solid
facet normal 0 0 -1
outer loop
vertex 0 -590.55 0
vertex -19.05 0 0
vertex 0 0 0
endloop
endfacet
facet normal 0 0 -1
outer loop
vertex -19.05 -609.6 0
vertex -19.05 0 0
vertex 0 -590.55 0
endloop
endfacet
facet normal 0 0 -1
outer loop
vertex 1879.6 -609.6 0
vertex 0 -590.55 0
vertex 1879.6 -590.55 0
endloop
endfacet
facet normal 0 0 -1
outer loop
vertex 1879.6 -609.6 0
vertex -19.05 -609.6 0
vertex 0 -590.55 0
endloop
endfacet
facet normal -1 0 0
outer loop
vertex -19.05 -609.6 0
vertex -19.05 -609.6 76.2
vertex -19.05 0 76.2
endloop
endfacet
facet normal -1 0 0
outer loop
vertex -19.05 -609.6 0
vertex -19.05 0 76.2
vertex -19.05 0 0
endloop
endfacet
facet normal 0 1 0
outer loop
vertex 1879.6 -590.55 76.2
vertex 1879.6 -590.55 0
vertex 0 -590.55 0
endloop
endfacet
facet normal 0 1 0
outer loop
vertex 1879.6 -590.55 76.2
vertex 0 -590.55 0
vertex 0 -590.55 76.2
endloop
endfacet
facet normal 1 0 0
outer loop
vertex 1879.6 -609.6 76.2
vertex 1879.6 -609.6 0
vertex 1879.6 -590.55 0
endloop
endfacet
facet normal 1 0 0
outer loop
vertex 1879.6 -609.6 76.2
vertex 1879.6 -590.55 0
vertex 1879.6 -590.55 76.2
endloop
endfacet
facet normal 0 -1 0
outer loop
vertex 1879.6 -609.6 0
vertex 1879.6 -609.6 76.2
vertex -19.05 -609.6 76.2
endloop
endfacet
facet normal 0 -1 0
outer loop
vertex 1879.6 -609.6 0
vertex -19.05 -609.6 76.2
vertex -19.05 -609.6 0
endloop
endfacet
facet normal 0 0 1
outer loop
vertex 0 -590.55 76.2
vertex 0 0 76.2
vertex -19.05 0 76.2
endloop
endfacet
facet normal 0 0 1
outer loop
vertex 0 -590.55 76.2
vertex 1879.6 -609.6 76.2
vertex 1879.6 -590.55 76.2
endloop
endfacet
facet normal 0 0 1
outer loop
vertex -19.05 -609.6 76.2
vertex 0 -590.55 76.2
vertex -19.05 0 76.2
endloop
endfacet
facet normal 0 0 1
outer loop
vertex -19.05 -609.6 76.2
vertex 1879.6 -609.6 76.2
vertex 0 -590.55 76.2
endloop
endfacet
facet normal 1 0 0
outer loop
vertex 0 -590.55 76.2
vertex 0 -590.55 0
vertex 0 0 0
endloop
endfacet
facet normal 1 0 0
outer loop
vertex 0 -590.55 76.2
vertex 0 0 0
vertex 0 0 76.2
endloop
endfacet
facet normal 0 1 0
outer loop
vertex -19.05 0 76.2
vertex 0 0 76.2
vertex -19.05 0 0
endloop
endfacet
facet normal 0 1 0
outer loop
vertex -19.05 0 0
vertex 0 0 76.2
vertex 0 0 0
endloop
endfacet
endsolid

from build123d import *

# Parameters (mm, degrees)
F1_W = 19.05
F1_H = 76.2


with BuildPart() as f2:
    # F2: sweep along a path in F0
    with BuildLine(Plane.XY) as f2_path:
        Line((0, 0), (0, -590.55))
        Line((0, -590.55), (1879.6, -590.55))
    # F1 (on Front) → F2 (sweep)
    with BuildSketch(Plane.XZ):
        with Locations((-9.525, 38.1)):
            Rectangle(F1_W, F1_H)
    sweep(path=f2_path.line, transition=Transition.RIGHT)


solid = f2.part
